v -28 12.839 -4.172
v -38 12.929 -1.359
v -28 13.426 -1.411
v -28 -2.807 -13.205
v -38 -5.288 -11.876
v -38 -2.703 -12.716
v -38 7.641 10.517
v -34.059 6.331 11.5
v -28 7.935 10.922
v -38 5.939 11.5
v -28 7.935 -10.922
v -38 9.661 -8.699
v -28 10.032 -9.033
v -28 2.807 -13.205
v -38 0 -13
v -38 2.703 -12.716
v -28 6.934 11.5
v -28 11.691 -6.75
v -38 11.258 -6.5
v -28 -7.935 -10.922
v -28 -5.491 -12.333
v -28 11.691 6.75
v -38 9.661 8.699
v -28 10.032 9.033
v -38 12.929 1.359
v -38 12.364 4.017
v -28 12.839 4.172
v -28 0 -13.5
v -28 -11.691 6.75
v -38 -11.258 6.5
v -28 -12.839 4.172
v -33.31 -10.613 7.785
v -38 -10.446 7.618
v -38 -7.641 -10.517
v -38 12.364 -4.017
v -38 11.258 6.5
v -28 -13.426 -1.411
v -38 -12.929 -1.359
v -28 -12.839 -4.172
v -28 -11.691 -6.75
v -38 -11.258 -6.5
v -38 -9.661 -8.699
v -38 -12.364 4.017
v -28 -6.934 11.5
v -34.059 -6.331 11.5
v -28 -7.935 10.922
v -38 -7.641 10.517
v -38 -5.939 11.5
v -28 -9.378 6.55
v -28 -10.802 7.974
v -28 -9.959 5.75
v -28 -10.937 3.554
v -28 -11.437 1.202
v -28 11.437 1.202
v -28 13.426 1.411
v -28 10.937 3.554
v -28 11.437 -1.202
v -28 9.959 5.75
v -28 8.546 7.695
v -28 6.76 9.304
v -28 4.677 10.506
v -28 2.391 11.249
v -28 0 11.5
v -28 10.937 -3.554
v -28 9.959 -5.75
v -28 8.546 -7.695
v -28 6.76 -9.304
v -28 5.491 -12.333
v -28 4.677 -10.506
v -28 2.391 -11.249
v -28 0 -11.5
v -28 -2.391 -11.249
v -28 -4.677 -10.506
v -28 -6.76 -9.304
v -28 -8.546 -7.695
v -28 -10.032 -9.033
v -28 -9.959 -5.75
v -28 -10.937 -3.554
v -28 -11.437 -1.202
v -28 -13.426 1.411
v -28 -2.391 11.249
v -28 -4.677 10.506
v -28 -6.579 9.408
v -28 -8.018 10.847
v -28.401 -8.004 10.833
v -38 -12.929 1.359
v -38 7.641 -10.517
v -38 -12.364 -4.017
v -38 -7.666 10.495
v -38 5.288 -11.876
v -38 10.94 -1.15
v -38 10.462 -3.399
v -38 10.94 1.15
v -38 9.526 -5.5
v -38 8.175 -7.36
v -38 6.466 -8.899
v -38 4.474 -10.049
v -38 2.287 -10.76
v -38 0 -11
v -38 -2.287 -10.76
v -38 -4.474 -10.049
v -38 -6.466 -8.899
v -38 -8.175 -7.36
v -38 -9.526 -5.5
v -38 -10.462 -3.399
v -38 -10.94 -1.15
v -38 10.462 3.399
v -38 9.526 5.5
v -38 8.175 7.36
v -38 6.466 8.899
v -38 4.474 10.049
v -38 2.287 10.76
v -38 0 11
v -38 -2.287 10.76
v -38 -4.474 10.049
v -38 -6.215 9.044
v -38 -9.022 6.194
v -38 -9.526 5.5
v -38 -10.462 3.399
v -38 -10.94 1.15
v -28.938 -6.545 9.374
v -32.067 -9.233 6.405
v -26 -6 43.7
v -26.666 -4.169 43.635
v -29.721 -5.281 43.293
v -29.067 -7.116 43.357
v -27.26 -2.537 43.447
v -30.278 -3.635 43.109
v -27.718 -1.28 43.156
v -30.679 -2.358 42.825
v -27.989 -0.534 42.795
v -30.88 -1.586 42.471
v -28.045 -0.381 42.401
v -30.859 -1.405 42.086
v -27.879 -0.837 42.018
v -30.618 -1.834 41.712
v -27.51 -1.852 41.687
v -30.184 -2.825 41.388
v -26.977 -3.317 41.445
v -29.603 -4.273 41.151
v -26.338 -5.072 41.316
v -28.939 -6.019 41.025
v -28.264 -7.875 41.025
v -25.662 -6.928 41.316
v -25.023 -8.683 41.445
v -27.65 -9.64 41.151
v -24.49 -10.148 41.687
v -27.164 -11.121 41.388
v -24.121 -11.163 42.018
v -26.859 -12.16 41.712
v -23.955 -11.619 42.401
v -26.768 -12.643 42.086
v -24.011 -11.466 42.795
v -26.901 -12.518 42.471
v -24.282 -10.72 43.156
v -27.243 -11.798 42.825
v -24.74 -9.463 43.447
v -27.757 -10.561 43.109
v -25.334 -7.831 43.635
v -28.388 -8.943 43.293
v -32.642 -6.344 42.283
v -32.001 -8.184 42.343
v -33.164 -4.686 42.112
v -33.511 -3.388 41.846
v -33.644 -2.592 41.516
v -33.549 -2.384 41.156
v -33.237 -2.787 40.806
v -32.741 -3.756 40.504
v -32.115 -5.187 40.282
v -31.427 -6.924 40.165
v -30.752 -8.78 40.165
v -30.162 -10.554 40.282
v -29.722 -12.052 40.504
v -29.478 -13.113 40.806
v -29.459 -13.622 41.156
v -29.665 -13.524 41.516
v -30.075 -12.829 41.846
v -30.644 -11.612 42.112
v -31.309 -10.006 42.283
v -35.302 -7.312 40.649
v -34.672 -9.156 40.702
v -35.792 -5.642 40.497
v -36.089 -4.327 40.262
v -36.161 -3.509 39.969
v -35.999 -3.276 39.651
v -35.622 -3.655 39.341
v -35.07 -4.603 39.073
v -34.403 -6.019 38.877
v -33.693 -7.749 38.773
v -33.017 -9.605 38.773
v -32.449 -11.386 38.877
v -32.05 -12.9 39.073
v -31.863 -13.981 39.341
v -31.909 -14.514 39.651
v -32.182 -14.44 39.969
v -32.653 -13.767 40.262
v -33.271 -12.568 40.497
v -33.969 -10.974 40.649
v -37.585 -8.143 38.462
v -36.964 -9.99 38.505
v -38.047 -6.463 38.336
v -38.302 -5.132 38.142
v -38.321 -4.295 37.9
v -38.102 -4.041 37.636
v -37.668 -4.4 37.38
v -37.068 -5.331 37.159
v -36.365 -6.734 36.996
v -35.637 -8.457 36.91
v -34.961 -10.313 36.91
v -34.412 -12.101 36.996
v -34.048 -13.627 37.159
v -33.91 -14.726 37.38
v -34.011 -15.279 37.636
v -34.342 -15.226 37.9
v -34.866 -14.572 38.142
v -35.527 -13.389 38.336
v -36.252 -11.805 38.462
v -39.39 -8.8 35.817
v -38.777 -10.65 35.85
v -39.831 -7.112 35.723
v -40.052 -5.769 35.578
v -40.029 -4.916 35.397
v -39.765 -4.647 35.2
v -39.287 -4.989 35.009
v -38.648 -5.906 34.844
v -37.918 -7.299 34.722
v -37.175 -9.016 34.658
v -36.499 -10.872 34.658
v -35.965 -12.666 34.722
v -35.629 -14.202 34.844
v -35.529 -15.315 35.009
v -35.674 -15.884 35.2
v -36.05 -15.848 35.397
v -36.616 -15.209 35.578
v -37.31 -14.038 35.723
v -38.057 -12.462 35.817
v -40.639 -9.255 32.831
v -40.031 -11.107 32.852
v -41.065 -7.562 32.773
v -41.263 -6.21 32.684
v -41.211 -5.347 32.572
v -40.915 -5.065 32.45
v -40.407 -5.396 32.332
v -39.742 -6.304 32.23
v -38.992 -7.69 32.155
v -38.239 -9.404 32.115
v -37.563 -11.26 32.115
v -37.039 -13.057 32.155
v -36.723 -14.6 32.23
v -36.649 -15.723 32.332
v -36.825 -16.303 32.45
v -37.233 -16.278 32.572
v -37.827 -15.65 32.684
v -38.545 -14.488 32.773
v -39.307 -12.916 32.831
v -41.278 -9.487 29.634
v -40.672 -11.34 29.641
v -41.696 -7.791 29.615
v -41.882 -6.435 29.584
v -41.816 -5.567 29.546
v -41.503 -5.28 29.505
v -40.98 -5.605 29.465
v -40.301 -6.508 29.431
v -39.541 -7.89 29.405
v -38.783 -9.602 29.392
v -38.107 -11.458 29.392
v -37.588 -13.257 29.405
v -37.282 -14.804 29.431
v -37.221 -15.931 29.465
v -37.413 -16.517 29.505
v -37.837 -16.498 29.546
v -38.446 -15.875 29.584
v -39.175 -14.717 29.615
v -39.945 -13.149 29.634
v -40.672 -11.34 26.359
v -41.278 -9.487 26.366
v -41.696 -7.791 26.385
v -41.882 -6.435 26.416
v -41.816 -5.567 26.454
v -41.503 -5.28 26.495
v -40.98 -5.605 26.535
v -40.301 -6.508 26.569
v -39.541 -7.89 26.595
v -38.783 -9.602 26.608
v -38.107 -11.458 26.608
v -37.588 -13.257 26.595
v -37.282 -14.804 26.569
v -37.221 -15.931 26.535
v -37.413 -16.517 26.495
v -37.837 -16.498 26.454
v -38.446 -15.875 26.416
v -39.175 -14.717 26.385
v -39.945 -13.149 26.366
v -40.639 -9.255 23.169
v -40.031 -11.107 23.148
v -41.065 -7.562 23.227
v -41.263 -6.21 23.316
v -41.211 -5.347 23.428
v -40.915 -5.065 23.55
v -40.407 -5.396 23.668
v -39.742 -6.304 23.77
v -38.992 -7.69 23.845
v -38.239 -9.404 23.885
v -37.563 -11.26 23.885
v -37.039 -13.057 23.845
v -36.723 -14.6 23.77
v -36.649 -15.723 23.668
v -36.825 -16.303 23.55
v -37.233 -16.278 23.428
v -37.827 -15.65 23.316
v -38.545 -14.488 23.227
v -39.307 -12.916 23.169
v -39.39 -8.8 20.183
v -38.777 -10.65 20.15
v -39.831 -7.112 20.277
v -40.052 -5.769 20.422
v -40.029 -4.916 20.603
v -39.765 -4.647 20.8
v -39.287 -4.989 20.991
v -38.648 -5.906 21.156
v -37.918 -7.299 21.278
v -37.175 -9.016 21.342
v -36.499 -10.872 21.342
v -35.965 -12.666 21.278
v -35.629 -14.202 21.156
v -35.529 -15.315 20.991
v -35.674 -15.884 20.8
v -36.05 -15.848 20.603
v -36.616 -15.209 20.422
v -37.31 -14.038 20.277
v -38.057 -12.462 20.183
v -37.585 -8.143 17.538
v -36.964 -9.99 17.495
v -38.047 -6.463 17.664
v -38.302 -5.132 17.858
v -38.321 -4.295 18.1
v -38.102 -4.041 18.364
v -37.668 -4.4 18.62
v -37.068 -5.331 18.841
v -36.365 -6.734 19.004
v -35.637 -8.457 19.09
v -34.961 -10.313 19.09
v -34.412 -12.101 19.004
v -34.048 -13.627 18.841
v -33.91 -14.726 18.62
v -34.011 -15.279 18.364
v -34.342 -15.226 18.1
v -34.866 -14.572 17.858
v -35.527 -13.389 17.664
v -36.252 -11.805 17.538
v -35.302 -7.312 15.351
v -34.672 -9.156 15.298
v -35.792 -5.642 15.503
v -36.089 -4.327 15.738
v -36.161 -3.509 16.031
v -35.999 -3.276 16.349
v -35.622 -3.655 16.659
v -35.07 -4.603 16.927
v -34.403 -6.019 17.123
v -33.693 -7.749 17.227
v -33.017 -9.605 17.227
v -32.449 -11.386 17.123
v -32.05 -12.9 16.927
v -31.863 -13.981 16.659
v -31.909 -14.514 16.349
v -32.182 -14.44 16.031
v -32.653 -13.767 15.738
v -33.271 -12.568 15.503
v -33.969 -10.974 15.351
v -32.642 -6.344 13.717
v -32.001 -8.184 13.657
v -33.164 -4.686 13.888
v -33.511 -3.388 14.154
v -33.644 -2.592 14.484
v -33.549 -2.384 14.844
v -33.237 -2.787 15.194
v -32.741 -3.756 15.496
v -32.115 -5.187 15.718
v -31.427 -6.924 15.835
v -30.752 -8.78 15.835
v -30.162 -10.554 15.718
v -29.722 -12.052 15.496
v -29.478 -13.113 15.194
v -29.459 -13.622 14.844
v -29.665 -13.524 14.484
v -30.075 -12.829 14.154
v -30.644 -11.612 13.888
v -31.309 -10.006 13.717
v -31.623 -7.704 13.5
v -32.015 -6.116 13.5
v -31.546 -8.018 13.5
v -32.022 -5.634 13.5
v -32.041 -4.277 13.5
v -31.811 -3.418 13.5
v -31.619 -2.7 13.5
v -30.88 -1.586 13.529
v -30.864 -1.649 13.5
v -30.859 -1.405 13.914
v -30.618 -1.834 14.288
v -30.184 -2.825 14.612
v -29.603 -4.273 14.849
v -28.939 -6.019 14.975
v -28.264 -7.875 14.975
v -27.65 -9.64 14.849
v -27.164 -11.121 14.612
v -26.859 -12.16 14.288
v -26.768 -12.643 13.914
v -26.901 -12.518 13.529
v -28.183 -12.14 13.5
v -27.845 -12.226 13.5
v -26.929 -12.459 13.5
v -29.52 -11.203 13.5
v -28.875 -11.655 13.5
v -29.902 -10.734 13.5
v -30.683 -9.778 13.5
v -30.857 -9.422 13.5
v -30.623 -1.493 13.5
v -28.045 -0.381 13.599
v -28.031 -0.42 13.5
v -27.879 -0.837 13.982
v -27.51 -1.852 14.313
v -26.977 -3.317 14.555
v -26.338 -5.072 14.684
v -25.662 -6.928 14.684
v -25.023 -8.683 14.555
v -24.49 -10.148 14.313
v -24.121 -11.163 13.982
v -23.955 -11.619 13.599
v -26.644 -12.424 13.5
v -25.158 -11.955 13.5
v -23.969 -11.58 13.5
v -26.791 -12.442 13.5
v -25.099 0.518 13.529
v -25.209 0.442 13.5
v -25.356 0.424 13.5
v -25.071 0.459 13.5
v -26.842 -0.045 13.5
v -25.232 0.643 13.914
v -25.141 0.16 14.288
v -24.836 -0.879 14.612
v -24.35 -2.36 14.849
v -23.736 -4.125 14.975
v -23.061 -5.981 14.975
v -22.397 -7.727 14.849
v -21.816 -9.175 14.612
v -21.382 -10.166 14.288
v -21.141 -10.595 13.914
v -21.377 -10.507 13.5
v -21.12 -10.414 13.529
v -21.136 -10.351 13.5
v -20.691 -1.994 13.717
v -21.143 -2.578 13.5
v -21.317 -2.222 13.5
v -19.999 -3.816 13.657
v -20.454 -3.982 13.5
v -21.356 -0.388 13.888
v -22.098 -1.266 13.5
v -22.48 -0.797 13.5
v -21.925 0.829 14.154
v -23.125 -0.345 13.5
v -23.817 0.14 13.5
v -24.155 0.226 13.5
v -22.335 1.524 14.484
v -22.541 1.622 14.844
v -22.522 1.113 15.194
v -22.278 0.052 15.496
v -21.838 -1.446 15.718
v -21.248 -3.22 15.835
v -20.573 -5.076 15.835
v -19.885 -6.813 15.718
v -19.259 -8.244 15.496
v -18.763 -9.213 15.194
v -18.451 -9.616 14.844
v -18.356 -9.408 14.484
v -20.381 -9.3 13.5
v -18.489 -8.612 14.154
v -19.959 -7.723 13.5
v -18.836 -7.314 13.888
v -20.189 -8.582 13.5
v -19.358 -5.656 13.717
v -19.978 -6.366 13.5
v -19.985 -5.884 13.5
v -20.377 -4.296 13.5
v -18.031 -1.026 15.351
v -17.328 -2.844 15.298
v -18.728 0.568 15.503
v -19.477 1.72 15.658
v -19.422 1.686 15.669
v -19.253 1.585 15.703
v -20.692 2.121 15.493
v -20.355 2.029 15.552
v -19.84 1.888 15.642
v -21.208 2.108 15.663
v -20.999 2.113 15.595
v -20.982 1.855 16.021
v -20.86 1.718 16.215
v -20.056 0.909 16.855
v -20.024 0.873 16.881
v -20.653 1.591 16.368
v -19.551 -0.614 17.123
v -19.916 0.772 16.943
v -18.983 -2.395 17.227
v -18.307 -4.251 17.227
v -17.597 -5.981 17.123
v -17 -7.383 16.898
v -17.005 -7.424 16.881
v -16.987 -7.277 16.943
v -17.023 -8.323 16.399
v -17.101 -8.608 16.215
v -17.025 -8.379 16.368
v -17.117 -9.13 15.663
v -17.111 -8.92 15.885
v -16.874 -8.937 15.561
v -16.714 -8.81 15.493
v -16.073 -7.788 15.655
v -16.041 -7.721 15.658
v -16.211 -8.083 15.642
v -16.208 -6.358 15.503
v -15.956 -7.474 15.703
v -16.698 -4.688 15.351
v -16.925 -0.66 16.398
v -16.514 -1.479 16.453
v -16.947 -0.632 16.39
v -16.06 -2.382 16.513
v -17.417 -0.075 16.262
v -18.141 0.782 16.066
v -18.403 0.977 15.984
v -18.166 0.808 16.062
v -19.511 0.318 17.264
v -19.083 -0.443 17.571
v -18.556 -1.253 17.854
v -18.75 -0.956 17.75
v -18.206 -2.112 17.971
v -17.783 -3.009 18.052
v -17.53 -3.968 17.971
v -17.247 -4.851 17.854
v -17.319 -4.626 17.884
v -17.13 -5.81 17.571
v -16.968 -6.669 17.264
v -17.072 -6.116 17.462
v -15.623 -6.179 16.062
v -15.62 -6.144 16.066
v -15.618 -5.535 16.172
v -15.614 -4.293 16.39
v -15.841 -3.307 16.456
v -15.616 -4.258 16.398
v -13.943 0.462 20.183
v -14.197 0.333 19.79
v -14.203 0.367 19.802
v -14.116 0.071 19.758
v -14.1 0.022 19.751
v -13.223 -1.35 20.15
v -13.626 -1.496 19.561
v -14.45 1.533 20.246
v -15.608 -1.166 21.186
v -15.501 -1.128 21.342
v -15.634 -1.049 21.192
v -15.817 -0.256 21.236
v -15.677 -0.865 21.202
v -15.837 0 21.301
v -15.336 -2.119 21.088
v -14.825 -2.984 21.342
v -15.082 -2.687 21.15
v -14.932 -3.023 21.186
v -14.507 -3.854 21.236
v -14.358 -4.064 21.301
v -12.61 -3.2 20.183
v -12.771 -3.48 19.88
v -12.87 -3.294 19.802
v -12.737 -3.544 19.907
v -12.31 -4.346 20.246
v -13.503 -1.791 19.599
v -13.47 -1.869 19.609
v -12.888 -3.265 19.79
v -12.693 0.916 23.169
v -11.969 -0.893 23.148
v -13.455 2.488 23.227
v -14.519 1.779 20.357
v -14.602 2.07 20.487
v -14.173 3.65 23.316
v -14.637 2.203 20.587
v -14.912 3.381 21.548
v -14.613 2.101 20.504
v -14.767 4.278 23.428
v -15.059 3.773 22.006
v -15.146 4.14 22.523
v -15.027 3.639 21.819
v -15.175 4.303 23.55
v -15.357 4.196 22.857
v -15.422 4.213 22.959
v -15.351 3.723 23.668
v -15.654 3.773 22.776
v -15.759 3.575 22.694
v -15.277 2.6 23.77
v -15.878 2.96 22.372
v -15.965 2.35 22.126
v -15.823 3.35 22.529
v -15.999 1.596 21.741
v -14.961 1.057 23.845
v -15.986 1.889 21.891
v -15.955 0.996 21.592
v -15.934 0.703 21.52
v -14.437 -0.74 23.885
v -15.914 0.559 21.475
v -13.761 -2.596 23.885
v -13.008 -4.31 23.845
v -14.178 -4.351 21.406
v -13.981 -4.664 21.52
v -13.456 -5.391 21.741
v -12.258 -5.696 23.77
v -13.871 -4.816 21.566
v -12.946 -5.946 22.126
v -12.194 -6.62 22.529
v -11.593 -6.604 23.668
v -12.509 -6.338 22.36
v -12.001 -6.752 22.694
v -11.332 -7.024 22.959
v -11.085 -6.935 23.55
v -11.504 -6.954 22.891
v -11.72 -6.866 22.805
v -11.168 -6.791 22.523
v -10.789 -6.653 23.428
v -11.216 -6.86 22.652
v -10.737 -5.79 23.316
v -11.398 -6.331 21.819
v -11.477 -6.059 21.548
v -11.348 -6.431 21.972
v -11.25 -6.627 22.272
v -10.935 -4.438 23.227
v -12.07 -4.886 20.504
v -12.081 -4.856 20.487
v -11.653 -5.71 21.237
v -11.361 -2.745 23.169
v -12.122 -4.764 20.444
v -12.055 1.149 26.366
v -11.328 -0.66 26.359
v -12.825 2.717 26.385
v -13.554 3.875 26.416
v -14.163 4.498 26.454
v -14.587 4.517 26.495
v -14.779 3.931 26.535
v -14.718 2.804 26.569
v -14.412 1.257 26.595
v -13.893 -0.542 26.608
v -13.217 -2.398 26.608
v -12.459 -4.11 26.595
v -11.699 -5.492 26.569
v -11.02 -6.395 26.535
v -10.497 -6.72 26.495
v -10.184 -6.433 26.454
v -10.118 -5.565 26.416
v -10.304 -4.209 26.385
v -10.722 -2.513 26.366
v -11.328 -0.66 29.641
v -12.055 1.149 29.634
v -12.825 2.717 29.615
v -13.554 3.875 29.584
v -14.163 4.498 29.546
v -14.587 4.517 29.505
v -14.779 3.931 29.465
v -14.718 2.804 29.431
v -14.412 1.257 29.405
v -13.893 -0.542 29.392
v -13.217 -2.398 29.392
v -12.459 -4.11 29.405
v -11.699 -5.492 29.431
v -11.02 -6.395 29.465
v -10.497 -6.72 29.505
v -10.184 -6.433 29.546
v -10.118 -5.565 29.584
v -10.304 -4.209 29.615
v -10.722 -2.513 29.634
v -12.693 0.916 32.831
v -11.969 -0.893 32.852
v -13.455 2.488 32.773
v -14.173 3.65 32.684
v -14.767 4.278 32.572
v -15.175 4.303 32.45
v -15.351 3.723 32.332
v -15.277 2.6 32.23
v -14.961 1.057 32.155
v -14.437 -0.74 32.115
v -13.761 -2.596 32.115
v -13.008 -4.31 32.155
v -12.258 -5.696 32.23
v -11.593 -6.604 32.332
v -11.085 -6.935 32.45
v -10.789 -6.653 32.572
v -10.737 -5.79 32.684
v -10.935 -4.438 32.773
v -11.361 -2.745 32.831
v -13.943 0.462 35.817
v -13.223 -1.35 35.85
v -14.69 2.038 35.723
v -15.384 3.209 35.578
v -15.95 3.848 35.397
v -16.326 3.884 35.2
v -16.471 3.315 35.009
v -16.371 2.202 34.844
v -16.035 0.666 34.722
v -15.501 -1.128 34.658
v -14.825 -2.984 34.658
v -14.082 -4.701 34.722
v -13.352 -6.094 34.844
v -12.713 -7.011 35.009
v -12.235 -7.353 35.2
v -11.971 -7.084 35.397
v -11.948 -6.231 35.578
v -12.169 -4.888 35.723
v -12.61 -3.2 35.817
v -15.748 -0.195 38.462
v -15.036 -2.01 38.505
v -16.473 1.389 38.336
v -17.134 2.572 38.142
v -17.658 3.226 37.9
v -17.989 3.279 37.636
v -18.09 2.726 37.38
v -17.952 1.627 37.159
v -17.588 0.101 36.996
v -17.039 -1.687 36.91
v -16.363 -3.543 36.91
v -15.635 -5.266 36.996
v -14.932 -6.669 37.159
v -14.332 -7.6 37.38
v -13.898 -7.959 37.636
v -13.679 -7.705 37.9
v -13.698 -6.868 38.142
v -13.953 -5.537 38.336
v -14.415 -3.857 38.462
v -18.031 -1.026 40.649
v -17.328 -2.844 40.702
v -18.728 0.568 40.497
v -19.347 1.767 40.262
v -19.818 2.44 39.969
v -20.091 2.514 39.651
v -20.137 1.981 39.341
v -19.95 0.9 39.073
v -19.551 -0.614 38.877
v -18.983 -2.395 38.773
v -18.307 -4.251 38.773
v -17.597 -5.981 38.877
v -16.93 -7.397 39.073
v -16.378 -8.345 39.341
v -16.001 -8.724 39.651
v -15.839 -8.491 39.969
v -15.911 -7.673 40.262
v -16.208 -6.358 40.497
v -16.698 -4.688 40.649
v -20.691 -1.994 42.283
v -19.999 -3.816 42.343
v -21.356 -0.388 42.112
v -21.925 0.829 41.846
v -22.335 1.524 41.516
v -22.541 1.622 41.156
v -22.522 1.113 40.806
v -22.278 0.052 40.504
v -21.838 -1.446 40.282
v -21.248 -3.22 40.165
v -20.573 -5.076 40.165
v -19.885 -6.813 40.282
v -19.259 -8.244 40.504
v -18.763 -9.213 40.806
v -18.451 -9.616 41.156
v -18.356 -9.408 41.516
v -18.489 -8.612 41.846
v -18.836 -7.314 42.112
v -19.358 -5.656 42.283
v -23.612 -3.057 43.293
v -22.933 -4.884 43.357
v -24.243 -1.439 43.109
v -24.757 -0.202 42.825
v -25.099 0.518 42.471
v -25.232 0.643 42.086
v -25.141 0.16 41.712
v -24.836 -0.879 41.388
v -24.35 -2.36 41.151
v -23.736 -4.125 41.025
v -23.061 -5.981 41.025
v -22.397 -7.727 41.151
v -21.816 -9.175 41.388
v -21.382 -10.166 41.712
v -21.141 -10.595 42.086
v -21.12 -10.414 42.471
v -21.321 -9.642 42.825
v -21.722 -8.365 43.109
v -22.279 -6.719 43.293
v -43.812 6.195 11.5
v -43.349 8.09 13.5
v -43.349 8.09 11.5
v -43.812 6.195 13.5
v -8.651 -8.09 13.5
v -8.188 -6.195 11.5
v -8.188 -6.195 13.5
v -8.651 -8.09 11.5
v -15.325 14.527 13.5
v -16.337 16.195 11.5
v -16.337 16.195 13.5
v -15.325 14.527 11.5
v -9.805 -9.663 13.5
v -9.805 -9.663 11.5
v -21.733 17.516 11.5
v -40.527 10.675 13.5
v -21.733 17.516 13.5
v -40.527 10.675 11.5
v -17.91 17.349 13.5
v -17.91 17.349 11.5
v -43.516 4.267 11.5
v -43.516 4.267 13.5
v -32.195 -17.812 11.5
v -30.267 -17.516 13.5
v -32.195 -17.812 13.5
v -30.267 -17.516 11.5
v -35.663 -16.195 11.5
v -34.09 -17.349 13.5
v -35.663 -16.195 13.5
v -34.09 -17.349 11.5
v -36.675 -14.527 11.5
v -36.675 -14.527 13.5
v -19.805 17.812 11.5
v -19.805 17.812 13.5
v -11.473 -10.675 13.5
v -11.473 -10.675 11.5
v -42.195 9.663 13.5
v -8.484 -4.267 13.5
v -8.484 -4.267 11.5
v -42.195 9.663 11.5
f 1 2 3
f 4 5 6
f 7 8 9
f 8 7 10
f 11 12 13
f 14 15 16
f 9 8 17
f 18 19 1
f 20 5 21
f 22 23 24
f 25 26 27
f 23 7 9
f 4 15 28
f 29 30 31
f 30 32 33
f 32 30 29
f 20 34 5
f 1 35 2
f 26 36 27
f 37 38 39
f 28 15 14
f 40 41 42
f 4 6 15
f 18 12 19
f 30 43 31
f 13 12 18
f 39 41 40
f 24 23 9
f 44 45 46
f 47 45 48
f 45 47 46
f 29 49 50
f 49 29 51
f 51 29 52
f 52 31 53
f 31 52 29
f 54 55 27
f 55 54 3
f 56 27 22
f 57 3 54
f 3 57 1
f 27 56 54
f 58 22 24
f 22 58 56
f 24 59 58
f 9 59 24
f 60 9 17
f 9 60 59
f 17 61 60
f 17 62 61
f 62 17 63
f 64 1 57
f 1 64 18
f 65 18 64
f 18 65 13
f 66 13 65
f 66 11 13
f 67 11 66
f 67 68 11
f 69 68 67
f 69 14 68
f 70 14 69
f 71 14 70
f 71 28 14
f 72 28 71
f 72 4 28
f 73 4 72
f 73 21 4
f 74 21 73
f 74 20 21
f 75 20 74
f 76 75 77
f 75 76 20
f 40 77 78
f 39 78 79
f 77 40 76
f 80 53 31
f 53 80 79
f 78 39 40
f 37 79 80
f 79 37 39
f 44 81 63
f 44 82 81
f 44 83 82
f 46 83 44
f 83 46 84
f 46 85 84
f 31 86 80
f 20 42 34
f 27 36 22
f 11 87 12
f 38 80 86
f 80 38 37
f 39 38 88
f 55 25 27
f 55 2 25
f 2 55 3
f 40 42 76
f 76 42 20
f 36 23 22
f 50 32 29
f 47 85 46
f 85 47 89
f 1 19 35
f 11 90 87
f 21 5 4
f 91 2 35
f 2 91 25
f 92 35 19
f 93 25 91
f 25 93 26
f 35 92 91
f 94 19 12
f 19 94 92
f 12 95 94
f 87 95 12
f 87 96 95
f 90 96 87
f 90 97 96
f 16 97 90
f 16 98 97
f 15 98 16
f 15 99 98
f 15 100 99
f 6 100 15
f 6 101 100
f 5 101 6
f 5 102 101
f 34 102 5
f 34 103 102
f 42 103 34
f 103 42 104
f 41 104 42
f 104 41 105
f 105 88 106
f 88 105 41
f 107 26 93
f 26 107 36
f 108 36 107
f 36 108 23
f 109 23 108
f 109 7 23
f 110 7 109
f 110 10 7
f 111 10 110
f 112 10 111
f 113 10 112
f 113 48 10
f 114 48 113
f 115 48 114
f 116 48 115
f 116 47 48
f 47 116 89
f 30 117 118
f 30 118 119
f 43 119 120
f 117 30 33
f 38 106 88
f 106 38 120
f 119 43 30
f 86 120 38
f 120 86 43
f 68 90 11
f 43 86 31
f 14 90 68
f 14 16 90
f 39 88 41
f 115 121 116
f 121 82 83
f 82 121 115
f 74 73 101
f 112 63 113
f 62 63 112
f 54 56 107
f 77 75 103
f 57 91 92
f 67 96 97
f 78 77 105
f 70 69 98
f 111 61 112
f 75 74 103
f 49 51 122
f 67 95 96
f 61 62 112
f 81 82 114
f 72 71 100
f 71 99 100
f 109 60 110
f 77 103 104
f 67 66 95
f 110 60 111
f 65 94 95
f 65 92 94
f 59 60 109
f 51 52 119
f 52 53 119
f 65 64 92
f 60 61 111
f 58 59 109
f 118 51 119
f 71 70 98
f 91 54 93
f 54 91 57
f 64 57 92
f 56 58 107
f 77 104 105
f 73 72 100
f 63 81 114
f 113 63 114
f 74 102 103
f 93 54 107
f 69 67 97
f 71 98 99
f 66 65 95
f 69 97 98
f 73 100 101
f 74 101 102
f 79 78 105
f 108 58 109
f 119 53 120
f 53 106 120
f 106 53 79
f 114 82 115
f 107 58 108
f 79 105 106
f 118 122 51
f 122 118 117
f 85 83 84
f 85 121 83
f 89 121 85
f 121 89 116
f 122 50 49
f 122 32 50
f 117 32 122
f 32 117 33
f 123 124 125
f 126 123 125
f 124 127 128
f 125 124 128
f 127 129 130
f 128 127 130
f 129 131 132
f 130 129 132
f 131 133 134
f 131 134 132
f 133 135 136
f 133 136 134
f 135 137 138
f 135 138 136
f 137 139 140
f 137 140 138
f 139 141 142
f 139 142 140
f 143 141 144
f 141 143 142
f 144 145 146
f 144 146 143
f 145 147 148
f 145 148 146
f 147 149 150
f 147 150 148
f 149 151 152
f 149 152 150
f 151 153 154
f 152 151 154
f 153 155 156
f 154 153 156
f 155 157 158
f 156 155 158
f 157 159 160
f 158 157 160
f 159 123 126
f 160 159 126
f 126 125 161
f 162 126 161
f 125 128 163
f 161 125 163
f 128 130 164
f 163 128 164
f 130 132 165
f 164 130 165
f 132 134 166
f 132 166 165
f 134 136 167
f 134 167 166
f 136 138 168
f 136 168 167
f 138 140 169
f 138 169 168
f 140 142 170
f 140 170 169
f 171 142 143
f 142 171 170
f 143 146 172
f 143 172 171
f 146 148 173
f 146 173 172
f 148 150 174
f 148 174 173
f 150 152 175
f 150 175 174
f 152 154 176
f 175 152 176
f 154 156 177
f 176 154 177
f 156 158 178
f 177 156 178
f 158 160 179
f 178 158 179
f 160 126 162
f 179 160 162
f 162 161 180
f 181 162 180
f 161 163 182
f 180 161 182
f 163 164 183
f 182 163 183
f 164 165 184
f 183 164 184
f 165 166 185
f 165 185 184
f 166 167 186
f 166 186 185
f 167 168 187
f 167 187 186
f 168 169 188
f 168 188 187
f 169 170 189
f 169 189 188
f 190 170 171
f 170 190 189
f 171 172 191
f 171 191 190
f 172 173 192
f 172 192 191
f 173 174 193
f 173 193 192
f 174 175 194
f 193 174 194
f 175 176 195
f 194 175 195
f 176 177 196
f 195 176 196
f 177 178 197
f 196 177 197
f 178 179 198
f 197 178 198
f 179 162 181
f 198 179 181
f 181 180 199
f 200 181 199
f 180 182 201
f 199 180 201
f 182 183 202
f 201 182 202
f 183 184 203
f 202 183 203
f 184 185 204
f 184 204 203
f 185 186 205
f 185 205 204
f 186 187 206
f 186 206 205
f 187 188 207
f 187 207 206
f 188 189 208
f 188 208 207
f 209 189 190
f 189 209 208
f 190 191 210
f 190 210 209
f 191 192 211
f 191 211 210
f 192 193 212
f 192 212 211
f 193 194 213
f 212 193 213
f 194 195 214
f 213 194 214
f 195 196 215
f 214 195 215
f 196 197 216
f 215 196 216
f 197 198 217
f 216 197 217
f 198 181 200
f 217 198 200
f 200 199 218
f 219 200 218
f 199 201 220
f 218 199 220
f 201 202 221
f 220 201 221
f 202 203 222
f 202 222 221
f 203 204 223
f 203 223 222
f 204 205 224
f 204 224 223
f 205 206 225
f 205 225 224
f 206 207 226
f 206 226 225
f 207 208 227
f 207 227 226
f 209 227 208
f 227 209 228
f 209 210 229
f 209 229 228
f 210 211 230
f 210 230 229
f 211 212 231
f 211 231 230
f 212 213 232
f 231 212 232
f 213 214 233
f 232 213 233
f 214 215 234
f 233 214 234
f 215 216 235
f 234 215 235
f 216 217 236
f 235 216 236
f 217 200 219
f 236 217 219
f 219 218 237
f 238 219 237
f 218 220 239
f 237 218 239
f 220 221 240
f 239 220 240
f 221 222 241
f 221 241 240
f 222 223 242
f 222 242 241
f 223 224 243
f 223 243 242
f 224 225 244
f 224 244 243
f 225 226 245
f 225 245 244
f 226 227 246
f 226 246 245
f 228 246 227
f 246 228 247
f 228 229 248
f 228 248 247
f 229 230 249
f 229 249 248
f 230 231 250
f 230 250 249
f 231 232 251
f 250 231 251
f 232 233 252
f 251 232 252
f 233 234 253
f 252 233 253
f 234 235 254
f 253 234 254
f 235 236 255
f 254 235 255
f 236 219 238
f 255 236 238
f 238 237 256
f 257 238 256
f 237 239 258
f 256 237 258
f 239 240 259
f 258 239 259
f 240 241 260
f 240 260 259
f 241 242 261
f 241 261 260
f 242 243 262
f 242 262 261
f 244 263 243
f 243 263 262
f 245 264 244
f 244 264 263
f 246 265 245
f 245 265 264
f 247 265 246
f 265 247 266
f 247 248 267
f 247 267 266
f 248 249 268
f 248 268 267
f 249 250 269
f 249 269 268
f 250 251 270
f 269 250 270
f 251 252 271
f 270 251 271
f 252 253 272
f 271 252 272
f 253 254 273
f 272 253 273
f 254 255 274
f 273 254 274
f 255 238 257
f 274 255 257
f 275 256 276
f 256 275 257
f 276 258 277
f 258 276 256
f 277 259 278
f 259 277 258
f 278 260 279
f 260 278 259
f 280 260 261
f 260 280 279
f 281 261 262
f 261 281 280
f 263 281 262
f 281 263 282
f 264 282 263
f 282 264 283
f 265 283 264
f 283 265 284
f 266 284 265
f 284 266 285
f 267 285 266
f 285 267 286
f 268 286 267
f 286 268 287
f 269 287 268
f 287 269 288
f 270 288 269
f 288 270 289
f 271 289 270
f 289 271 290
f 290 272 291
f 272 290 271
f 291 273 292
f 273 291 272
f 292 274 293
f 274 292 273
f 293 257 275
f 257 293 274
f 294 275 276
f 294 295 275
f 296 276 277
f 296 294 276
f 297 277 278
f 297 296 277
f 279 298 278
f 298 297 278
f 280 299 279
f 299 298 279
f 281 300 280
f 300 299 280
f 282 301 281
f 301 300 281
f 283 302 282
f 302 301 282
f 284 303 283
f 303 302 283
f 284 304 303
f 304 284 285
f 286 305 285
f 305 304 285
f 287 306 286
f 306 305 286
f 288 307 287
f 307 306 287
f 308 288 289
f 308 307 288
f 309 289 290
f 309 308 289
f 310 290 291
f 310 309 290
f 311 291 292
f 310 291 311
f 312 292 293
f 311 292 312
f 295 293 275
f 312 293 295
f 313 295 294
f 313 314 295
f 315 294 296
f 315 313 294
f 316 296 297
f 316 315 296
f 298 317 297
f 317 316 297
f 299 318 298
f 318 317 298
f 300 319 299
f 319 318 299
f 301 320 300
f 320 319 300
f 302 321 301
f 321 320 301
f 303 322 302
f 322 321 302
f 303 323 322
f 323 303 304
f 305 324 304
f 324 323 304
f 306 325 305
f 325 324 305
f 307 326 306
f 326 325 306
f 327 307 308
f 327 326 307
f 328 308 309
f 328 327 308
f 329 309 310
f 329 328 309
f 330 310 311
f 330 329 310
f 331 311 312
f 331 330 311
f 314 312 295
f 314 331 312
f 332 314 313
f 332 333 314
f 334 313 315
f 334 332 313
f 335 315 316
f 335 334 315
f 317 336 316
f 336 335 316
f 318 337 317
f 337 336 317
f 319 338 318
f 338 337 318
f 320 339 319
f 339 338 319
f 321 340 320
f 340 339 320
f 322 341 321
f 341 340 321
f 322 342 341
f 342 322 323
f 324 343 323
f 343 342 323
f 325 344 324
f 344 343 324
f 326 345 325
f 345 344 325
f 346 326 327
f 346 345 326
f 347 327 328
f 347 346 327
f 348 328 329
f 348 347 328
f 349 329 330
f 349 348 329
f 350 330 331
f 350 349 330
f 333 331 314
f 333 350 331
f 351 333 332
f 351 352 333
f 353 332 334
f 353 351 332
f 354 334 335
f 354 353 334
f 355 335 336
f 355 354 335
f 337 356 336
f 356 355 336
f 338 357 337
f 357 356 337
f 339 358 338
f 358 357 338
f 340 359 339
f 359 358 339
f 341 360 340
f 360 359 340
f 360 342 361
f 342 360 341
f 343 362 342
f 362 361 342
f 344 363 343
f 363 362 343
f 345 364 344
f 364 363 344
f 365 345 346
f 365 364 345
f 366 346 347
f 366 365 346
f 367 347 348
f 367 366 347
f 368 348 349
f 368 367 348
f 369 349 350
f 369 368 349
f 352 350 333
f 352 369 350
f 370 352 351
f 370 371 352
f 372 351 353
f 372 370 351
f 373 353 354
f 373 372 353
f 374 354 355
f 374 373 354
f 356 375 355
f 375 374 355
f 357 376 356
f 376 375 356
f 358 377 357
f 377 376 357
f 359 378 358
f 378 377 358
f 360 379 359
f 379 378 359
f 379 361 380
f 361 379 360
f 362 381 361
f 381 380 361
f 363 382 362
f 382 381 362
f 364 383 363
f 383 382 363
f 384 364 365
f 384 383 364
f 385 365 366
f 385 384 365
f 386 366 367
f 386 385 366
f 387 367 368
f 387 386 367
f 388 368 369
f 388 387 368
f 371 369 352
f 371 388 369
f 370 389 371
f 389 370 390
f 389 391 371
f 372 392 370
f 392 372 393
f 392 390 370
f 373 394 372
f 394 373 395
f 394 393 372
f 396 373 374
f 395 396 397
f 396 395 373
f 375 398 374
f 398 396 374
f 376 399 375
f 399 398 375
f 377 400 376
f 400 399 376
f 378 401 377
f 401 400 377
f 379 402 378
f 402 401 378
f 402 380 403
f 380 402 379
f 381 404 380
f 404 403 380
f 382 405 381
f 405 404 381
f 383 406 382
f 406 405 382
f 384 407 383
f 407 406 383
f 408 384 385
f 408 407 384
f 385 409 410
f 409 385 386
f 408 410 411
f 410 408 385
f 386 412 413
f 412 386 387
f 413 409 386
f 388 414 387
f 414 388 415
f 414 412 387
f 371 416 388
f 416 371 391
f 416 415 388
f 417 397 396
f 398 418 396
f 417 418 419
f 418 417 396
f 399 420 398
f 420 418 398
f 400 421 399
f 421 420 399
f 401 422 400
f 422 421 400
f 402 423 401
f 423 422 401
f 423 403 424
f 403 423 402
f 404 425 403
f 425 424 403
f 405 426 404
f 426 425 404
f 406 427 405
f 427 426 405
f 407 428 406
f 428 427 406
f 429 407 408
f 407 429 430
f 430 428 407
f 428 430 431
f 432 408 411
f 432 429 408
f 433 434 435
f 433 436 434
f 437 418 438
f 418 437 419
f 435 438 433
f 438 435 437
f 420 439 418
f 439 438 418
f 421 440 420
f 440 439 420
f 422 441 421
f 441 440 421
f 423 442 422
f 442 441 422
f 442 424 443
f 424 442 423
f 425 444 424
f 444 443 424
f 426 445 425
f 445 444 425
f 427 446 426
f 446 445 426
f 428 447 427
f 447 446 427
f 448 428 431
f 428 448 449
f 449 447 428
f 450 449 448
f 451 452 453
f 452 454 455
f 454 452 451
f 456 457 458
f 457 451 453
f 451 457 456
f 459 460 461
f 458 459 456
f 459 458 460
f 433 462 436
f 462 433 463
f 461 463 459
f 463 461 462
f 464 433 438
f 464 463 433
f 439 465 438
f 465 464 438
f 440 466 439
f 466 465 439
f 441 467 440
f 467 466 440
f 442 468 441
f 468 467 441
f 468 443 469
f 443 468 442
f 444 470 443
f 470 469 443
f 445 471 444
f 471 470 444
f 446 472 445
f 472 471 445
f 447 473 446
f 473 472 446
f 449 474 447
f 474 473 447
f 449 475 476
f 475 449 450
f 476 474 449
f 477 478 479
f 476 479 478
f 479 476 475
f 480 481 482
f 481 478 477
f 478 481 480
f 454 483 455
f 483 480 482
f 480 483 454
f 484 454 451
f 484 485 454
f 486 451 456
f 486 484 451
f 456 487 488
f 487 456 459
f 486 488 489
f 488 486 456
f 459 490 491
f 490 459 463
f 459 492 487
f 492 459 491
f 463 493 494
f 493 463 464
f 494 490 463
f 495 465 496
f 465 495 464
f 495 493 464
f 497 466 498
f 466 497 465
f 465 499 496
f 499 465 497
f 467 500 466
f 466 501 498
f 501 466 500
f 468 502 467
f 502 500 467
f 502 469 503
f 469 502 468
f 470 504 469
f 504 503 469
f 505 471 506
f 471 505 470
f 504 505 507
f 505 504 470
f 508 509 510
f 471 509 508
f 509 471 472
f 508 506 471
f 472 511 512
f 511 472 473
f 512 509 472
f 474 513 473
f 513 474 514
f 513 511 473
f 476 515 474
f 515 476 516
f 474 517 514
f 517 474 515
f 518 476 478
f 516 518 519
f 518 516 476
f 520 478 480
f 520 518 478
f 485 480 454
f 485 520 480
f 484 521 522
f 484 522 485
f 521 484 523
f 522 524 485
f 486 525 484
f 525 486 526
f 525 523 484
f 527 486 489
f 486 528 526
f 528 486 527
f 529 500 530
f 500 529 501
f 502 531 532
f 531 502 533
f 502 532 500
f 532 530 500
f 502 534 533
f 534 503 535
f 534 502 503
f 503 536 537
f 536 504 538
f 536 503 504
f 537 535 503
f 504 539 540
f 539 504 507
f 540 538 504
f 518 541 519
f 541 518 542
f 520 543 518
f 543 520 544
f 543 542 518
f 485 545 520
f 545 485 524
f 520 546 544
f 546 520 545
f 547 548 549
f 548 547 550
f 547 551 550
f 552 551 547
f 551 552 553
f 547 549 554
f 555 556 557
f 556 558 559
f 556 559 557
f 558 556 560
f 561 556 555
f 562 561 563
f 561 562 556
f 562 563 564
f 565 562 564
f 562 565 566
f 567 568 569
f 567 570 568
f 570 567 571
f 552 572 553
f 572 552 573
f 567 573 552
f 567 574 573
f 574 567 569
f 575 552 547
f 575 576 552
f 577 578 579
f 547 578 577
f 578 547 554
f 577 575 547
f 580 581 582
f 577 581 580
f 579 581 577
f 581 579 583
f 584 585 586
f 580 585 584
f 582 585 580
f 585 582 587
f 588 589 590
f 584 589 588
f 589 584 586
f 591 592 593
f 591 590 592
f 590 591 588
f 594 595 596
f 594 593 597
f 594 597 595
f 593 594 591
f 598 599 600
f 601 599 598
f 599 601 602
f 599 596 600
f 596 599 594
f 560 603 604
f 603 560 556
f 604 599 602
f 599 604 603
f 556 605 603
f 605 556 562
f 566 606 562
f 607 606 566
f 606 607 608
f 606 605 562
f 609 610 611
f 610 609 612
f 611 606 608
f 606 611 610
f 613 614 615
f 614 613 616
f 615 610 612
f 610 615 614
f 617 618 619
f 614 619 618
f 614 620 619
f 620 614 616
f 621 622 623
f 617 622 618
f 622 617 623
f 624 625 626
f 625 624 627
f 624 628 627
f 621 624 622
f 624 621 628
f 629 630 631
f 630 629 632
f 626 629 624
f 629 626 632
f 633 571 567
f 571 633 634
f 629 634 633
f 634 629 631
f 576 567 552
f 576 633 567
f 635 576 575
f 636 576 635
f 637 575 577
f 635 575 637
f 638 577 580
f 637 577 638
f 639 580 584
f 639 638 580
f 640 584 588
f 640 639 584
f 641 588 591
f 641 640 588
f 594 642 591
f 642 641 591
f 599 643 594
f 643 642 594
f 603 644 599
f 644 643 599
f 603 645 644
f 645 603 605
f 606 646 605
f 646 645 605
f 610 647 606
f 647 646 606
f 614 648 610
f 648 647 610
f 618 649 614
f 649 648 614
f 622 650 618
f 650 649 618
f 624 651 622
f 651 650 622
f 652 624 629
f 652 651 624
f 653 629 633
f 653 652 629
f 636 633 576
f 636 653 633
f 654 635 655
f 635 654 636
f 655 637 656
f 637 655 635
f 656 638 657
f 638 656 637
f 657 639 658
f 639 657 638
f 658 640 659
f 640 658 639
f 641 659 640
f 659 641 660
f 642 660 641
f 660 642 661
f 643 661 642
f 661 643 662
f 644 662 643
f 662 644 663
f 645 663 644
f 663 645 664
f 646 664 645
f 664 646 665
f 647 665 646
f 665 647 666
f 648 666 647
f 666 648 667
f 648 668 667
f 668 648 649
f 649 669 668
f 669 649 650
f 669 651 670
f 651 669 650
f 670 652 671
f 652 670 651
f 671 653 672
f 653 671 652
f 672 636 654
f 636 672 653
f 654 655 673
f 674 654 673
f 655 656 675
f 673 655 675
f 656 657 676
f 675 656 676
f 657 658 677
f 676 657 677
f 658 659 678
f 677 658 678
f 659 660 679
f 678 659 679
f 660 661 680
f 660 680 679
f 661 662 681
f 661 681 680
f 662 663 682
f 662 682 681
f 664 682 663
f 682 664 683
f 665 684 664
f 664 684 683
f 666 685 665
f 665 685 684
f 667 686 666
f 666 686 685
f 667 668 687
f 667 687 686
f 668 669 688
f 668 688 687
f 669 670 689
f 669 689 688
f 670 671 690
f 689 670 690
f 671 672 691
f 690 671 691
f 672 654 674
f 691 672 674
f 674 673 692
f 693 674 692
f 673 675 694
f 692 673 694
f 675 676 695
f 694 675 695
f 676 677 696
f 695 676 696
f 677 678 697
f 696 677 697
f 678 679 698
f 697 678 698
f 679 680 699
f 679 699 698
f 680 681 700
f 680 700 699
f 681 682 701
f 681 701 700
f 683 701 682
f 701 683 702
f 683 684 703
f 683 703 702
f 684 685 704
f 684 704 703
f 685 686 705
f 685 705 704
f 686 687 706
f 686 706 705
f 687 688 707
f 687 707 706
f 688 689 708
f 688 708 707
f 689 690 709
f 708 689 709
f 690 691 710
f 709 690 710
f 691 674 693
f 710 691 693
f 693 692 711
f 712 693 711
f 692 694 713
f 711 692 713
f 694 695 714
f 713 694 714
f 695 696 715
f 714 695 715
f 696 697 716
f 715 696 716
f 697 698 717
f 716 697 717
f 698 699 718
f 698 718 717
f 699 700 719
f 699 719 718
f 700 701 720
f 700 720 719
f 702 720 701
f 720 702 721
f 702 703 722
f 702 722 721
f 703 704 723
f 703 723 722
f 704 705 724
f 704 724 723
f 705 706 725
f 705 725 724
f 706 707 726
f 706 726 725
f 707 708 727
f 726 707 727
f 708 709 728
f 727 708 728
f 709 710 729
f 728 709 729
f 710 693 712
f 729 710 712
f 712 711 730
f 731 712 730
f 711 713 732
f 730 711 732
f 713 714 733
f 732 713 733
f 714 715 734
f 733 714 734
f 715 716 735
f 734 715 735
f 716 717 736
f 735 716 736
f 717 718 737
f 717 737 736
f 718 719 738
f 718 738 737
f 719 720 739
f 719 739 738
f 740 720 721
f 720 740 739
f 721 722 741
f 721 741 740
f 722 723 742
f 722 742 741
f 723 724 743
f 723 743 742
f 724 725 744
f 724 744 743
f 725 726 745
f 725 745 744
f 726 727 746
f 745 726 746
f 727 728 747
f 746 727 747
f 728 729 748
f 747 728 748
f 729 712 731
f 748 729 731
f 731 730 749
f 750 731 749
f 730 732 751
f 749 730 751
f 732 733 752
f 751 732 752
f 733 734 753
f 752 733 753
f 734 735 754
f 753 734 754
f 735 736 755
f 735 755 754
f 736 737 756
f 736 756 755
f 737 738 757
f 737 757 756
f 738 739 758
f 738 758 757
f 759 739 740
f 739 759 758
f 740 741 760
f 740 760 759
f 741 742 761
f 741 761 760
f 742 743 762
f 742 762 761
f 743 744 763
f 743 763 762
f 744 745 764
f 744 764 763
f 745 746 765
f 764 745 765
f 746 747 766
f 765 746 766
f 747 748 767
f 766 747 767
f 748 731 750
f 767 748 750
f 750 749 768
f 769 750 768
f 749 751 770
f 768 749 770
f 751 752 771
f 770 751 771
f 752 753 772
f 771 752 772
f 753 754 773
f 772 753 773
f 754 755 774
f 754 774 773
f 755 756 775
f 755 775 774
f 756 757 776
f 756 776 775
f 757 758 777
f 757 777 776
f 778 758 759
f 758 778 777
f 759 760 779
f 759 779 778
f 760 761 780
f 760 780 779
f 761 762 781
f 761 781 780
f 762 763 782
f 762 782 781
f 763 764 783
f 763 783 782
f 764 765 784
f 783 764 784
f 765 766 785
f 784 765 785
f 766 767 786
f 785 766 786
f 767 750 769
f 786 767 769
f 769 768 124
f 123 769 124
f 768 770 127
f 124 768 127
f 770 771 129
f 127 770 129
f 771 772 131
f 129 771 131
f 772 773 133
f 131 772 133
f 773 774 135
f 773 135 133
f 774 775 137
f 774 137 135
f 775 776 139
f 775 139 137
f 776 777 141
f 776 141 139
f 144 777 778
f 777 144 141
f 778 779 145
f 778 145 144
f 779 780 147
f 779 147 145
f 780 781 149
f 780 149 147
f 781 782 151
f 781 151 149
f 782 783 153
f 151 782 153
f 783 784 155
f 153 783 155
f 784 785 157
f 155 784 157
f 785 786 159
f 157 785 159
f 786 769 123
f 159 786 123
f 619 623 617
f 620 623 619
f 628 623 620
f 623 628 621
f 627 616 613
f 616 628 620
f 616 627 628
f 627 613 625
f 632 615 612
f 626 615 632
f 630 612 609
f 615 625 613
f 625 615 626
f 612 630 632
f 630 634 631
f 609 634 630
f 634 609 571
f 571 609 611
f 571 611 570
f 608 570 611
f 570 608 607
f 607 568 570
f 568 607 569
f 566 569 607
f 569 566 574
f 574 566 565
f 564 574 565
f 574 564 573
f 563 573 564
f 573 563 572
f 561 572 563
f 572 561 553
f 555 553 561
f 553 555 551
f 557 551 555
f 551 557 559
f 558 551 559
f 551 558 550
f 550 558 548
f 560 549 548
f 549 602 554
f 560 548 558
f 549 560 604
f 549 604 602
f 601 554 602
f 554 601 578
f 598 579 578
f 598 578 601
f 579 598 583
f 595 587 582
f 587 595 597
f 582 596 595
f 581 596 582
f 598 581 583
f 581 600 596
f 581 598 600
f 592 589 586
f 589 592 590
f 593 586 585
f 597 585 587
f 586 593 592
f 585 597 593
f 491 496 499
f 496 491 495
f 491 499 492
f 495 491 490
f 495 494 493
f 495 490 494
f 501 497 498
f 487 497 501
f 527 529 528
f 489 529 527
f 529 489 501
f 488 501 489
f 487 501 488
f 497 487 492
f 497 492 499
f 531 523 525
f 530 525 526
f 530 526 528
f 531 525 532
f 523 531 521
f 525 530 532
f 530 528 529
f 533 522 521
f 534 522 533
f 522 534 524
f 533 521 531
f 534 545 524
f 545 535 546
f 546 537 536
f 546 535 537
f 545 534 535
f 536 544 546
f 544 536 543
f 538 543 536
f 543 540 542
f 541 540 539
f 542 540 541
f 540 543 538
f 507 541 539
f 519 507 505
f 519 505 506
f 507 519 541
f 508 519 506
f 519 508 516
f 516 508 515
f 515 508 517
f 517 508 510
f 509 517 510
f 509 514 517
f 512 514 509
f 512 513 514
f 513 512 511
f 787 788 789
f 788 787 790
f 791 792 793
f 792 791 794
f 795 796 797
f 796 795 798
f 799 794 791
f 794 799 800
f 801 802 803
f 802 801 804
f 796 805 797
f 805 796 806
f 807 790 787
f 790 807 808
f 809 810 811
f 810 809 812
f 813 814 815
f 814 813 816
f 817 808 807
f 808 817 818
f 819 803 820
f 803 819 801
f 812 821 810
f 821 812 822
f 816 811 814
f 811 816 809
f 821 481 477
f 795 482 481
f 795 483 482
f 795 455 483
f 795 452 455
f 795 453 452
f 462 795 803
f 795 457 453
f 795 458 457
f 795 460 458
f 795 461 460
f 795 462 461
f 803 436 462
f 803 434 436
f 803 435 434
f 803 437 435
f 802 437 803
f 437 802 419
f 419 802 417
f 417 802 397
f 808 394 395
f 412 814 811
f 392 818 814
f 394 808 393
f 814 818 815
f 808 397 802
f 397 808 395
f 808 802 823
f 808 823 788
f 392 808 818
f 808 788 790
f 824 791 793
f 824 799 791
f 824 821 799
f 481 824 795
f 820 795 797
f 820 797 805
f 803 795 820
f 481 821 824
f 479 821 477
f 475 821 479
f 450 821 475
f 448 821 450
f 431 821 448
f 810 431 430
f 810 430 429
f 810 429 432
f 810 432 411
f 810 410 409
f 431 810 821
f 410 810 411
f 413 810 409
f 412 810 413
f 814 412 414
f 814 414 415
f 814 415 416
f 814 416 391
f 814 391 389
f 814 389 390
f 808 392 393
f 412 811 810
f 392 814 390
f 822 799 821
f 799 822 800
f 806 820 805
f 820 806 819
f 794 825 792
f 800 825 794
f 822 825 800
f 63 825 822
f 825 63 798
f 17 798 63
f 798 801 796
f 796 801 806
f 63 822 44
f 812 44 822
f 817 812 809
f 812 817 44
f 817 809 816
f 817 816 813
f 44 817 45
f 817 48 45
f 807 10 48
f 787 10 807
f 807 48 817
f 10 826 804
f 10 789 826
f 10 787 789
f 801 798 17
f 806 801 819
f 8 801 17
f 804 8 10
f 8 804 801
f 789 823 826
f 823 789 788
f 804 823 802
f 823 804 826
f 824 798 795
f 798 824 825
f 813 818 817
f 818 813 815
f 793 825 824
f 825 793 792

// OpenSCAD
// Perch1
// Owl perch for the Art Bike

Thick=2;

//----------------------------------------------------------------------------------
// left handlebar
translate([-28,0,0]) rotate([0,-90,0])
difference(){
    cylinder(r1=11.5+Thick, r2=11.0+Thick, h=10);
    cylinder(r1=11.5, r2=11.0, h=10);
    rotate([0,0,-45]) translate([10,0,0])
    linear_extrude(height=15){
        square(size=[15,4],center=true);
    }
    
}
// left footpad
translate([-26,0,11.5]) rotate([0,0,20])
linear_extrude(height=Thick){
    offset(r=5) square(size=[20,20],center=true);
}
// left footstrap
translate([-26,-6,28]) rotate([0,90,110])
difference(){
    rotate_extrude(){
        translate([14.5,0,0]) scale([0.2,1.0]) circle(r=6);
    }

//    rotate([0,0,-50]) translate([10,0,-8])
//    linear_extrude(height=15){
//        square(size=[15,5],center=true);
    rotate([90,0,-140]) translate([0,0,-18])
    linear_extrude(height=15){
        difference(){
            square(size=[12,15],center=true);
            translate([10,0]) circle(r=8,center=true);
            translate([-10,0]) circle(r=8,center=true);
        }
    }
}

/*
//----------------------------------------------------------------------------------
// right handlebar
translate([28,0,0]) rotate([0,90,0])
difference(){
    cylinder(r1=11.5+Thick, r2=11.0+Thick, h=10);
    cylinder(r1=11.5, r2=11.0, h=10);
    rotate([0,0,230]) translate([10,0,0])
    linear_extrude(height=15){
        square(size=[15,4],center=true);
    }
}
// right footpad
translate([26,0,11.5]) rotate([0,0,-20])
linear_extrude(height=Thick){
    offset(r=5) square(size=[20,20],center=true);
}
// right footstrap
translate([26,-6,28]) rotate([0,90,70])
difference(){
    rotate_extrude(){
        translate([14.5,0,0]) scale([0.2,1.0]) circle(r=6);
    }

//    rotate([0,0,50]) translate([10,0,-8])
//    linear_extrude(height=15){
//        square(size=[15,5],center=true);
//    }
        rotate([90,0,-40]) translate([0,0,-18])
    linear_extrude(height=15){
        difference(){
            square(size=[12,15],center=true);
            translate([10,0]) circle(r=8,center=true);
            translate([-10,0]) circle(r=8,center=true);
        }
    }

}

//----------------------------------------------------------------------------------
// tail bar
rotate([10,0,0])
translate([0,-35,0]) rotate([90,0,0])
difference(){
    cylinder(r1=18+Thick, r2=18+Thick, h=10);
    cylinder(r1=18, r2=18, h=10);
    rotate([0,0,-90]) translate([15,0,0])
    linear_extrude(height=15){
        square(size=[15,4],center=true);
    }
}
// tail pad
translate([0,-42,11.5]) rotate([0,0,0])
linear_extrude(height=Thick){
    offset(r=5) square(size=[54,4],center=true);
}

// tail strap
translate([0,-46,38]) rotate([0,80,90])
difference(){
    rotate_extrude(){
        translate([25,0,0]) scale([0.2,1.0]) circle(r=6);
    }

    rotate([0,0,50]) translate([10,0,-8])
    linear_extrude(height=15){
        square(size=[15,5],center=true);
    }
}

//----------------------------------------------------------------------------------
// vertical posts
translate([25,-42,-10]){
    cylinder(r1=4,r2=3,h=115);
    linear_extrude(height=10) offset(r=2) square(size=[8,8],center=true);
}
translate([-25,-42,-10]){
    cylinder(r1=4,r2=3,h=115);
    linear_extrude(height=10) offset(r=2) square(size=[8,8],center=true);
}

// back strap
translate([0,-7,100])
difference(){
    scale([0.7,1,1]) rotate_extrude(){
        translate([50,0,0]) scale([0.2,1.0]) circle(r=6);
    }

    rotate([0,0,0]) translate([-100,0,-8])
    linear_extrude(height=15){
        square(size=[200,200]);
    }
}

// lance mounting block
translate([38,-36,96]) rotate([-80,0,0])
    difference(){
        linear_extrude(height=30) offset(r=2) square(size=[8,8],center=true);
        cylinder(r1=4,r2=2,h=80);
    }

// shield mounting block
translate([-38,-36,96]) rotate([-80,0,0])
    difference(){
        linear_extrude(height=30) offset(r=2) square(size=[8,8],center=true);
        cylinder(r1=4,r2=2,h=80);
    }

// halo holders
translate([-30,-42,40]) rotate([10,0,0])
    difference(){
        linear_extrude(height=20) offset(r=2) square(size=[6,6],center=true);
        cylinder(r1=2,r2=1.6,h=30);
    }
    
translate([30,-42,40]) rotate([10,0,0])
    difference(){
        linear_extrude(height=20) offset(r=2) square(size=[6,6],center=true);
        cylinder(r1=2,r2=1.6,h=30);
    }
    
*/
